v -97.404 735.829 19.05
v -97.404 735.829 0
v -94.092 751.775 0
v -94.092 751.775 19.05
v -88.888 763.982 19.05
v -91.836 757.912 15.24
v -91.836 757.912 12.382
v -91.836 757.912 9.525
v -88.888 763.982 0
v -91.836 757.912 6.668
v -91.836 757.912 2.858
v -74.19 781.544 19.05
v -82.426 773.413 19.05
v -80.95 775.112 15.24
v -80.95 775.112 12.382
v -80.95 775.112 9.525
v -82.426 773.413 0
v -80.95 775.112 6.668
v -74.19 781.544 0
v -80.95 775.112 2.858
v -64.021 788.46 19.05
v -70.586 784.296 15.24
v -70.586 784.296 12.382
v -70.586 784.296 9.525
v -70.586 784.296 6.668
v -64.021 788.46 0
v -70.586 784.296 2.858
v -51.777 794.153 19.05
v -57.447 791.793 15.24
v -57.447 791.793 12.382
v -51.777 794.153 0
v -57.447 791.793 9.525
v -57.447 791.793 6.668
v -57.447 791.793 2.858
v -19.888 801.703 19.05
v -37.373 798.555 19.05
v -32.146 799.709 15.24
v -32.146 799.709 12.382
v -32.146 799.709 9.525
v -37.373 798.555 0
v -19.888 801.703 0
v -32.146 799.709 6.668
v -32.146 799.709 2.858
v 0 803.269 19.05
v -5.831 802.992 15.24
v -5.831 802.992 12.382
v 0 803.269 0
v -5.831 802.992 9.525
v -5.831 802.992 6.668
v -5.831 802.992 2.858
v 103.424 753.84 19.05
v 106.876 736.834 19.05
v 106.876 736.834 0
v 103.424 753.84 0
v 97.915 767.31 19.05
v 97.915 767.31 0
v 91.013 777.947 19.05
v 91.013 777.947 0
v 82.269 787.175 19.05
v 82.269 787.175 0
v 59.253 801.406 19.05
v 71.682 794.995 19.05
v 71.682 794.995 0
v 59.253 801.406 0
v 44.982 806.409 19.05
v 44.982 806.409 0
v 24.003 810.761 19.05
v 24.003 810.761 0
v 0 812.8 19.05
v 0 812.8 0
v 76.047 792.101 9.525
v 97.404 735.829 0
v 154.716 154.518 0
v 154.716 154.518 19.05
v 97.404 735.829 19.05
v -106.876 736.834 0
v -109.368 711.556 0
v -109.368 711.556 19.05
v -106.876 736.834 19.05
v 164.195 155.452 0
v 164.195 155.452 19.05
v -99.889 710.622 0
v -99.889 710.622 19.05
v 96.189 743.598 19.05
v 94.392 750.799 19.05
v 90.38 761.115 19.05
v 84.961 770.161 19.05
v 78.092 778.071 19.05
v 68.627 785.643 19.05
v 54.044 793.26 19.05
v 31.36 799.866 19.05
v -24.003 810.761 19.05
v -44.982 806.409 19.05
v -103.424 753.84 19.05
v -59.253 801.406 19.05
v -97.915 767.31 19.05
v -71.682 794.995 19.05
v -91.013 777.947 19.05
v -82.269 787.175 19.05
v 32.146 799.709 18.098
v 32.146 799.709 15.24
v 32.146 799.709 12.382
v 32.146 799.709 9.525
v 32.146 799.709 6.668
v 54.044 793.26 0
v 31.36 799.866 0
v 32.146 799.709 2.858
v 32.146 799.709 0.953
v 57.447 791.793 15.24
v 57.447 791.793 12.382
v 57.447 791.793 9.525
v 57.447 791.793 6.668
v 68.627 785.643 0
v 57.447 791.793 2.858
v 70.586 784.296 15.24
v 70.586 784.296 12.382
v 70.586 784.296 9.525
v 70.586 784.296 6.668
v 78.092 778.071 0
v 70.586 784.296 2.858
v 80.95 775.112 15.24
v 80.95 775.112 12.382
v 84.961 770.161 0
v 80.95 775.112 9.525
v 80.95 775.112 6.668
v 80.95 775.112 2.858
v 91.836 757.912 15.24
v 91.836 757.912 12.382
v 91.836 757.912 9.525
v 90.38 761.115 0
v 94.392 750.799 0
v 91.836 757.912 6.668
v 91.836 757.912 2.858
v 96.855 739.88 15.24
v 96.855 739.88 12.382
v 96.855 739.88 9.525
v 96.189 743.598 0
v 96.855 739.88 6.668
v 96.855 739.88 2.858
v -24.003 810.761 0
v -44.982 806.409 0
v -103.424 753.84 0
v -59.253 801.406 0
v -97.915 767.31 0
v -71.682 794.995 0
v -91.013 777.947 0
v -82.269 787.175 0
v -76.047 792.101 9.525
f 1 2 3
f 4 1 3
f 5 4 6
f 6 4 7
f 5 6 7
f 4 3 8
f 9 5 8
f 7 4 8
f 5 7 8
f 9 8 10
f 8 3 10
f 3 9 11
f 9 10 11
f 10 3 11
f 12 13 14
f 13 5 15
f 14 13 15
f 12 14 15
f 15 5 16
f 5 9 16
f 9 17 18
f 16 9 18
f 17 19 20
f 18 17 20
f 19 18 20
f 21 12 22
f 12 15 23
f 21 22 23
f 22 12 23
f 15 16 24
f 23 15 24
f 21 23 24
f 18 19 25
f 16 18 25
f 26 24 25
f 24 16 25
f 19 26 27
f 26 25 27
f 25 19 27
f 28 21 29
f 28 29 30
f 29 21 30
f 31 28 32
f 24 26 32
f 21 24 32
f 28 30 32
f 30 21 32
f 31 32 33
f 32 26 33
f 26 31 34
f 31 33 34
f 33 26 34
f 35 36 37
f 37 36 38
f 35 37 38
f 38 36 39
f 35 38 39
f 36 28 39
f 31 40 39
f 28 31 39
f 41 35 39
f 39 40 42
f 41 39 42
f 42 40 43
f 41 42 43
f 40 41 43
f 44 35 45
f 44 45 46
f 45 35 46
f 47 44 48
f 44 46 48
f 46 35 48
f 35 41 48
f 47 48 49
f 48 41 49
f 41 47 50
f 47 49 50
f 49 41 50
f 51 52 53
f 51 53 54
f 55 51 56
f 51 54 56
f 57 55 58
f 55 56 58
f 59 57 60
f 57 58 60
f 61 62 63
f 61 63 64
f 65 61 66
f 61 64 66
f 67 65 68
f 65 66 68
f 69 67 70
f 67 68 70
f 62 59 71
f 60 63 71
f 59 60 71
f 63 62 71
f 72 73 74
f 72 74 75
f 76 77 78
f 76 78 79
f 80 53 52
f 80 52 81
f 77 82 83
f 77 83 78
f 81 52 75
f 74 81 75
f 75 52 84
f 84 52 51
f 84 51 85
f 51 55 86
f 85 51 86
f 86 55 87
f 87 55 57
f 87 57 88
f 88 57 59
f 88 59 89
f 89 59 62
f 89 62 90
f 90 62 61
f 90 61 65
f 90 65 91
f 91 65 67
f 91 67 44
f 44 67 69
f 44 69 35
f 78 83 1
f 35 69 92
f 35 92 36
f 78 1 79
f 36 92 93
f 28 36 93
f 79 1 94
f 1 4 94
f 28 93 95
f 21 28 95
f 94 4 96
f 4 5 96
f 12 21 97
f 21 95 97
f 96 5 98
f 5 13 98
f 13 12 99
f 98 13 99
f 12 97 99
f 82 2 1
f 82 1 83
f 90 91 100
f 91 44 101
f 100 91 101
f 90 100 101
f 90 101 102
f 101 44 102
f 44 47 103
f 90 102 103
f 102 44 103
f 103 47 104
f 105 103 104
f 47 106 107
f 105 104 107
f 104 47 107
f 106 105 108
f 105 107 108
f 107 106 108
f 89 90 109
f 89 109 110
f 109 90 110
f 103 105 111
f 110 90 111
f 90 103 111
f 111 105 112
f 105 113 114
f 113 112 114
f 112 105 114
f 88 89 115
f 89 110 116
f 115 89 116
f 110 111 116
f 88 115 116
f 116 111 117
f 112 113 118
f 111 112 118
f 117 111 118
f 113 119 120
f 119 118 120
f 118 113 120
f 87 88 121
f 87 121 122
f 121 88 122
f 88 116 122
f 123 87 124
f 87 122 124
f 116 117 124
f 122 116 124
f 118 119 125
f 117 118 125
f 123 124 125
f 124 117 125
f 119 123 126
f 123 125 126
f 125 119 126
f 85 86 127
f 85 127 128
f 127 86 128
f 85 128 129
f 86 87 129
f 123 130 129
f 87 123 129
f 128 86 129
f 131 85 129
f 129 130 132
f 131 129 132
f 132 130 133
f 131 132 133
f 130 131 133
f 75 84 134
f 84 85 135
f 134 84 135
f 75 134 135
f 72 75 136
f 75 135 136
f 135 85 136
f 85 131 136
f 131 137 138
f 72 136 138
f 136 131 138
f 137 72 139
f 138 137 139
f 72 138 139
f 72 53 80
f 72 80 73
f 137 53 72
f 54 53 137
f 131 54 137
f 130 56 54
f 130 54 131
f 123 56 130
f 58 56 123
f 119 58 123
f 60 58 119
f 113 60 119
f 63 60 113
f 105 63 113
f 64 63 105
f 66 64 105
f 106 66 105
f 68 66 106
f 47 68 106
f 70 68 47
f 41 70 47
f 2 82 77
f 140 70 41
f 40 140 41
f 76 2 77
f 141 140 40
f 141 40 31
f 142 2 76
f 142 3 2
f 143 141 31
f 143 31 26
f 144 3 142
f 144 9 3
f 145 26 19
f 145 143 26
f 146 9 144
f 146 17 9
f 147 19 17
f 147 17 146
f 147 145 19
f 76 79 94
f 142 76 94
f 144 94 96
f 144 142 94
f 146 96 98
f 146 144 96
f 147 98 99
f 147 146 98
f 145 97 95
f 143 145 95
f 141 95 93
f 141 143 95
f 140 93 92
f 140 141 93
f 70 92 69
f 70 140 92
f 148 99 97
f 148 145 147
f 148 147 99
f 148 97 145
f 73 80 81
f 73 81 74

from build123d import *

# Parameters (mm, degrees)
BOSS_EXTRUDE1_DEPTH = 19.05


with BuildPart() as part:
    # Sketch1 → Boss-Extrude1 (new body)
    with BuildSketch(Plane.XY):
        with BuildLine():
            Line((154.716315659, 154.51789158), (97.403993572, 735.828587024))
            add(Edge.make_bspline(
                [(0, 803.26908628), (0.979817658, 803.233925105), (2.950075123, 803.151909058), (6.800362849, 802.946009068), (11.504912112, 802.608232022), (16.957304332, 802.075979486), (23.975792063, 801.198424891), (32.273128008, 799.790052384), (41.46699497, 797.614109593), (49.89784204, 794.967332344), (60.129456963, 790.832450746), (71.050790712, 784.572420078), (79.648241417, 776.932392043), (85.274313562, 769.943199813), (88.89525226, 764.228265264), (91.933130485, 758.00316425), (93.979934001, 752.359286407), (95.321414001, 747.554999291), (96.177362738, 743.805316844), (96.764020616, 740.553537606), (97.155379667, 737.881968465), (97.326205951, 736.51096636), (97.403993572, 735.828587024)],
                knots=[0.000508173, 0.000508173, 0.000508173, 0.000508173, 0.016098161, 0.031688149, 0.062868125, 0.094048101, 0.125228077, 0.187588029, 0.249947981, 0.312307933, 0.374667885, 0.499387789, 0.624107693, 0.686467645, 0.748827597, 0.811187549, 0.873547501, 0.904727477, 0.935907453, 0.967087429, 0.982677417, 0.998267405, 0.998267405, 0.998267405, 0.998267405], degree=3))
            add(Edge.make_bspline(
                [(-97.403993572, 735.828587024), (-97.326205951, 736.51096636), (-97.155379667, 737.881968465), (-96.764020616, 740.553537606), (-96.177362738, 743.805316844), (-95.321414001, 747.554999291), (-93.979934001, 752.359286407), (-91.933130485, 758.00316425), (-88.89525226, 764.228265264), (-85.274313562, 769.943199813), (-79.648241417, 776.932392043), (-71.050790712, 784.572420078), (-60.129456963, 790.832450746), (-49.89784204, 794.967332344), (-41.46699497, 797.614109593), (-32.273128008, 799.790052384), (-23.975792063, 801.198424891), (-16.957304332, 802.075979486), (-11.504912112, 802.608232022), (-6.800362849, 802.946009068), (-2.950075123, 803.151909058), (-0.979817658, 803.233925105), (0, 803.26908628)],
                knots=[0.000508173, 0.000508173, 0.000508173, 0.000508173, 0.016098161, 0.031688149, 0.062868125, 0.094048101, 0.125228077, 0.187588029, 0.249947981, 0.312307933, 0.374667885, 0.499387789, 0.624107693, 0.686467645, 0.748827597, 0.811187549, 0.873547501, 0.904727477, 0.935907453, 0.967087429, 0.982677417, 0.998267405, 0.998267405, 0.998267405, 0.998267405], degree=3))
            Line((-97.403993572, 735.828587024), (-99.889181424, 710.621681669))
            Line((-99.889181424, 710.621681669), (-109.368223301, 711.556235093))
            Line((-109.368223301, 711.556235093), (-106.876080835, 736.833680097))
            add(Edge.make_bspline(
                [(-106.876080835, 736.833680097), (-98.655564568, 809.385111394), (0, 812.8)],
                knots=[0, 0, 0, 1, 1, 1], degree=2))
            add(Edge.make_bspline(
                [(106.876080835, 736.833680097), (98.655564568, 809.385111394), (0, 812.8)],
                knots=[0, 0, 0, 1, 1, 1], degree=2))
            Line((106.876080835, 736.833680097), (164.195357535, 155.452445004))
            Line((164.195357535, 155.452445004), (154.716315659, 154.51789158))
        make_face()
    extrude(amount=BOSS_EXTRUDE1_DEPTH)


solid = part.part
